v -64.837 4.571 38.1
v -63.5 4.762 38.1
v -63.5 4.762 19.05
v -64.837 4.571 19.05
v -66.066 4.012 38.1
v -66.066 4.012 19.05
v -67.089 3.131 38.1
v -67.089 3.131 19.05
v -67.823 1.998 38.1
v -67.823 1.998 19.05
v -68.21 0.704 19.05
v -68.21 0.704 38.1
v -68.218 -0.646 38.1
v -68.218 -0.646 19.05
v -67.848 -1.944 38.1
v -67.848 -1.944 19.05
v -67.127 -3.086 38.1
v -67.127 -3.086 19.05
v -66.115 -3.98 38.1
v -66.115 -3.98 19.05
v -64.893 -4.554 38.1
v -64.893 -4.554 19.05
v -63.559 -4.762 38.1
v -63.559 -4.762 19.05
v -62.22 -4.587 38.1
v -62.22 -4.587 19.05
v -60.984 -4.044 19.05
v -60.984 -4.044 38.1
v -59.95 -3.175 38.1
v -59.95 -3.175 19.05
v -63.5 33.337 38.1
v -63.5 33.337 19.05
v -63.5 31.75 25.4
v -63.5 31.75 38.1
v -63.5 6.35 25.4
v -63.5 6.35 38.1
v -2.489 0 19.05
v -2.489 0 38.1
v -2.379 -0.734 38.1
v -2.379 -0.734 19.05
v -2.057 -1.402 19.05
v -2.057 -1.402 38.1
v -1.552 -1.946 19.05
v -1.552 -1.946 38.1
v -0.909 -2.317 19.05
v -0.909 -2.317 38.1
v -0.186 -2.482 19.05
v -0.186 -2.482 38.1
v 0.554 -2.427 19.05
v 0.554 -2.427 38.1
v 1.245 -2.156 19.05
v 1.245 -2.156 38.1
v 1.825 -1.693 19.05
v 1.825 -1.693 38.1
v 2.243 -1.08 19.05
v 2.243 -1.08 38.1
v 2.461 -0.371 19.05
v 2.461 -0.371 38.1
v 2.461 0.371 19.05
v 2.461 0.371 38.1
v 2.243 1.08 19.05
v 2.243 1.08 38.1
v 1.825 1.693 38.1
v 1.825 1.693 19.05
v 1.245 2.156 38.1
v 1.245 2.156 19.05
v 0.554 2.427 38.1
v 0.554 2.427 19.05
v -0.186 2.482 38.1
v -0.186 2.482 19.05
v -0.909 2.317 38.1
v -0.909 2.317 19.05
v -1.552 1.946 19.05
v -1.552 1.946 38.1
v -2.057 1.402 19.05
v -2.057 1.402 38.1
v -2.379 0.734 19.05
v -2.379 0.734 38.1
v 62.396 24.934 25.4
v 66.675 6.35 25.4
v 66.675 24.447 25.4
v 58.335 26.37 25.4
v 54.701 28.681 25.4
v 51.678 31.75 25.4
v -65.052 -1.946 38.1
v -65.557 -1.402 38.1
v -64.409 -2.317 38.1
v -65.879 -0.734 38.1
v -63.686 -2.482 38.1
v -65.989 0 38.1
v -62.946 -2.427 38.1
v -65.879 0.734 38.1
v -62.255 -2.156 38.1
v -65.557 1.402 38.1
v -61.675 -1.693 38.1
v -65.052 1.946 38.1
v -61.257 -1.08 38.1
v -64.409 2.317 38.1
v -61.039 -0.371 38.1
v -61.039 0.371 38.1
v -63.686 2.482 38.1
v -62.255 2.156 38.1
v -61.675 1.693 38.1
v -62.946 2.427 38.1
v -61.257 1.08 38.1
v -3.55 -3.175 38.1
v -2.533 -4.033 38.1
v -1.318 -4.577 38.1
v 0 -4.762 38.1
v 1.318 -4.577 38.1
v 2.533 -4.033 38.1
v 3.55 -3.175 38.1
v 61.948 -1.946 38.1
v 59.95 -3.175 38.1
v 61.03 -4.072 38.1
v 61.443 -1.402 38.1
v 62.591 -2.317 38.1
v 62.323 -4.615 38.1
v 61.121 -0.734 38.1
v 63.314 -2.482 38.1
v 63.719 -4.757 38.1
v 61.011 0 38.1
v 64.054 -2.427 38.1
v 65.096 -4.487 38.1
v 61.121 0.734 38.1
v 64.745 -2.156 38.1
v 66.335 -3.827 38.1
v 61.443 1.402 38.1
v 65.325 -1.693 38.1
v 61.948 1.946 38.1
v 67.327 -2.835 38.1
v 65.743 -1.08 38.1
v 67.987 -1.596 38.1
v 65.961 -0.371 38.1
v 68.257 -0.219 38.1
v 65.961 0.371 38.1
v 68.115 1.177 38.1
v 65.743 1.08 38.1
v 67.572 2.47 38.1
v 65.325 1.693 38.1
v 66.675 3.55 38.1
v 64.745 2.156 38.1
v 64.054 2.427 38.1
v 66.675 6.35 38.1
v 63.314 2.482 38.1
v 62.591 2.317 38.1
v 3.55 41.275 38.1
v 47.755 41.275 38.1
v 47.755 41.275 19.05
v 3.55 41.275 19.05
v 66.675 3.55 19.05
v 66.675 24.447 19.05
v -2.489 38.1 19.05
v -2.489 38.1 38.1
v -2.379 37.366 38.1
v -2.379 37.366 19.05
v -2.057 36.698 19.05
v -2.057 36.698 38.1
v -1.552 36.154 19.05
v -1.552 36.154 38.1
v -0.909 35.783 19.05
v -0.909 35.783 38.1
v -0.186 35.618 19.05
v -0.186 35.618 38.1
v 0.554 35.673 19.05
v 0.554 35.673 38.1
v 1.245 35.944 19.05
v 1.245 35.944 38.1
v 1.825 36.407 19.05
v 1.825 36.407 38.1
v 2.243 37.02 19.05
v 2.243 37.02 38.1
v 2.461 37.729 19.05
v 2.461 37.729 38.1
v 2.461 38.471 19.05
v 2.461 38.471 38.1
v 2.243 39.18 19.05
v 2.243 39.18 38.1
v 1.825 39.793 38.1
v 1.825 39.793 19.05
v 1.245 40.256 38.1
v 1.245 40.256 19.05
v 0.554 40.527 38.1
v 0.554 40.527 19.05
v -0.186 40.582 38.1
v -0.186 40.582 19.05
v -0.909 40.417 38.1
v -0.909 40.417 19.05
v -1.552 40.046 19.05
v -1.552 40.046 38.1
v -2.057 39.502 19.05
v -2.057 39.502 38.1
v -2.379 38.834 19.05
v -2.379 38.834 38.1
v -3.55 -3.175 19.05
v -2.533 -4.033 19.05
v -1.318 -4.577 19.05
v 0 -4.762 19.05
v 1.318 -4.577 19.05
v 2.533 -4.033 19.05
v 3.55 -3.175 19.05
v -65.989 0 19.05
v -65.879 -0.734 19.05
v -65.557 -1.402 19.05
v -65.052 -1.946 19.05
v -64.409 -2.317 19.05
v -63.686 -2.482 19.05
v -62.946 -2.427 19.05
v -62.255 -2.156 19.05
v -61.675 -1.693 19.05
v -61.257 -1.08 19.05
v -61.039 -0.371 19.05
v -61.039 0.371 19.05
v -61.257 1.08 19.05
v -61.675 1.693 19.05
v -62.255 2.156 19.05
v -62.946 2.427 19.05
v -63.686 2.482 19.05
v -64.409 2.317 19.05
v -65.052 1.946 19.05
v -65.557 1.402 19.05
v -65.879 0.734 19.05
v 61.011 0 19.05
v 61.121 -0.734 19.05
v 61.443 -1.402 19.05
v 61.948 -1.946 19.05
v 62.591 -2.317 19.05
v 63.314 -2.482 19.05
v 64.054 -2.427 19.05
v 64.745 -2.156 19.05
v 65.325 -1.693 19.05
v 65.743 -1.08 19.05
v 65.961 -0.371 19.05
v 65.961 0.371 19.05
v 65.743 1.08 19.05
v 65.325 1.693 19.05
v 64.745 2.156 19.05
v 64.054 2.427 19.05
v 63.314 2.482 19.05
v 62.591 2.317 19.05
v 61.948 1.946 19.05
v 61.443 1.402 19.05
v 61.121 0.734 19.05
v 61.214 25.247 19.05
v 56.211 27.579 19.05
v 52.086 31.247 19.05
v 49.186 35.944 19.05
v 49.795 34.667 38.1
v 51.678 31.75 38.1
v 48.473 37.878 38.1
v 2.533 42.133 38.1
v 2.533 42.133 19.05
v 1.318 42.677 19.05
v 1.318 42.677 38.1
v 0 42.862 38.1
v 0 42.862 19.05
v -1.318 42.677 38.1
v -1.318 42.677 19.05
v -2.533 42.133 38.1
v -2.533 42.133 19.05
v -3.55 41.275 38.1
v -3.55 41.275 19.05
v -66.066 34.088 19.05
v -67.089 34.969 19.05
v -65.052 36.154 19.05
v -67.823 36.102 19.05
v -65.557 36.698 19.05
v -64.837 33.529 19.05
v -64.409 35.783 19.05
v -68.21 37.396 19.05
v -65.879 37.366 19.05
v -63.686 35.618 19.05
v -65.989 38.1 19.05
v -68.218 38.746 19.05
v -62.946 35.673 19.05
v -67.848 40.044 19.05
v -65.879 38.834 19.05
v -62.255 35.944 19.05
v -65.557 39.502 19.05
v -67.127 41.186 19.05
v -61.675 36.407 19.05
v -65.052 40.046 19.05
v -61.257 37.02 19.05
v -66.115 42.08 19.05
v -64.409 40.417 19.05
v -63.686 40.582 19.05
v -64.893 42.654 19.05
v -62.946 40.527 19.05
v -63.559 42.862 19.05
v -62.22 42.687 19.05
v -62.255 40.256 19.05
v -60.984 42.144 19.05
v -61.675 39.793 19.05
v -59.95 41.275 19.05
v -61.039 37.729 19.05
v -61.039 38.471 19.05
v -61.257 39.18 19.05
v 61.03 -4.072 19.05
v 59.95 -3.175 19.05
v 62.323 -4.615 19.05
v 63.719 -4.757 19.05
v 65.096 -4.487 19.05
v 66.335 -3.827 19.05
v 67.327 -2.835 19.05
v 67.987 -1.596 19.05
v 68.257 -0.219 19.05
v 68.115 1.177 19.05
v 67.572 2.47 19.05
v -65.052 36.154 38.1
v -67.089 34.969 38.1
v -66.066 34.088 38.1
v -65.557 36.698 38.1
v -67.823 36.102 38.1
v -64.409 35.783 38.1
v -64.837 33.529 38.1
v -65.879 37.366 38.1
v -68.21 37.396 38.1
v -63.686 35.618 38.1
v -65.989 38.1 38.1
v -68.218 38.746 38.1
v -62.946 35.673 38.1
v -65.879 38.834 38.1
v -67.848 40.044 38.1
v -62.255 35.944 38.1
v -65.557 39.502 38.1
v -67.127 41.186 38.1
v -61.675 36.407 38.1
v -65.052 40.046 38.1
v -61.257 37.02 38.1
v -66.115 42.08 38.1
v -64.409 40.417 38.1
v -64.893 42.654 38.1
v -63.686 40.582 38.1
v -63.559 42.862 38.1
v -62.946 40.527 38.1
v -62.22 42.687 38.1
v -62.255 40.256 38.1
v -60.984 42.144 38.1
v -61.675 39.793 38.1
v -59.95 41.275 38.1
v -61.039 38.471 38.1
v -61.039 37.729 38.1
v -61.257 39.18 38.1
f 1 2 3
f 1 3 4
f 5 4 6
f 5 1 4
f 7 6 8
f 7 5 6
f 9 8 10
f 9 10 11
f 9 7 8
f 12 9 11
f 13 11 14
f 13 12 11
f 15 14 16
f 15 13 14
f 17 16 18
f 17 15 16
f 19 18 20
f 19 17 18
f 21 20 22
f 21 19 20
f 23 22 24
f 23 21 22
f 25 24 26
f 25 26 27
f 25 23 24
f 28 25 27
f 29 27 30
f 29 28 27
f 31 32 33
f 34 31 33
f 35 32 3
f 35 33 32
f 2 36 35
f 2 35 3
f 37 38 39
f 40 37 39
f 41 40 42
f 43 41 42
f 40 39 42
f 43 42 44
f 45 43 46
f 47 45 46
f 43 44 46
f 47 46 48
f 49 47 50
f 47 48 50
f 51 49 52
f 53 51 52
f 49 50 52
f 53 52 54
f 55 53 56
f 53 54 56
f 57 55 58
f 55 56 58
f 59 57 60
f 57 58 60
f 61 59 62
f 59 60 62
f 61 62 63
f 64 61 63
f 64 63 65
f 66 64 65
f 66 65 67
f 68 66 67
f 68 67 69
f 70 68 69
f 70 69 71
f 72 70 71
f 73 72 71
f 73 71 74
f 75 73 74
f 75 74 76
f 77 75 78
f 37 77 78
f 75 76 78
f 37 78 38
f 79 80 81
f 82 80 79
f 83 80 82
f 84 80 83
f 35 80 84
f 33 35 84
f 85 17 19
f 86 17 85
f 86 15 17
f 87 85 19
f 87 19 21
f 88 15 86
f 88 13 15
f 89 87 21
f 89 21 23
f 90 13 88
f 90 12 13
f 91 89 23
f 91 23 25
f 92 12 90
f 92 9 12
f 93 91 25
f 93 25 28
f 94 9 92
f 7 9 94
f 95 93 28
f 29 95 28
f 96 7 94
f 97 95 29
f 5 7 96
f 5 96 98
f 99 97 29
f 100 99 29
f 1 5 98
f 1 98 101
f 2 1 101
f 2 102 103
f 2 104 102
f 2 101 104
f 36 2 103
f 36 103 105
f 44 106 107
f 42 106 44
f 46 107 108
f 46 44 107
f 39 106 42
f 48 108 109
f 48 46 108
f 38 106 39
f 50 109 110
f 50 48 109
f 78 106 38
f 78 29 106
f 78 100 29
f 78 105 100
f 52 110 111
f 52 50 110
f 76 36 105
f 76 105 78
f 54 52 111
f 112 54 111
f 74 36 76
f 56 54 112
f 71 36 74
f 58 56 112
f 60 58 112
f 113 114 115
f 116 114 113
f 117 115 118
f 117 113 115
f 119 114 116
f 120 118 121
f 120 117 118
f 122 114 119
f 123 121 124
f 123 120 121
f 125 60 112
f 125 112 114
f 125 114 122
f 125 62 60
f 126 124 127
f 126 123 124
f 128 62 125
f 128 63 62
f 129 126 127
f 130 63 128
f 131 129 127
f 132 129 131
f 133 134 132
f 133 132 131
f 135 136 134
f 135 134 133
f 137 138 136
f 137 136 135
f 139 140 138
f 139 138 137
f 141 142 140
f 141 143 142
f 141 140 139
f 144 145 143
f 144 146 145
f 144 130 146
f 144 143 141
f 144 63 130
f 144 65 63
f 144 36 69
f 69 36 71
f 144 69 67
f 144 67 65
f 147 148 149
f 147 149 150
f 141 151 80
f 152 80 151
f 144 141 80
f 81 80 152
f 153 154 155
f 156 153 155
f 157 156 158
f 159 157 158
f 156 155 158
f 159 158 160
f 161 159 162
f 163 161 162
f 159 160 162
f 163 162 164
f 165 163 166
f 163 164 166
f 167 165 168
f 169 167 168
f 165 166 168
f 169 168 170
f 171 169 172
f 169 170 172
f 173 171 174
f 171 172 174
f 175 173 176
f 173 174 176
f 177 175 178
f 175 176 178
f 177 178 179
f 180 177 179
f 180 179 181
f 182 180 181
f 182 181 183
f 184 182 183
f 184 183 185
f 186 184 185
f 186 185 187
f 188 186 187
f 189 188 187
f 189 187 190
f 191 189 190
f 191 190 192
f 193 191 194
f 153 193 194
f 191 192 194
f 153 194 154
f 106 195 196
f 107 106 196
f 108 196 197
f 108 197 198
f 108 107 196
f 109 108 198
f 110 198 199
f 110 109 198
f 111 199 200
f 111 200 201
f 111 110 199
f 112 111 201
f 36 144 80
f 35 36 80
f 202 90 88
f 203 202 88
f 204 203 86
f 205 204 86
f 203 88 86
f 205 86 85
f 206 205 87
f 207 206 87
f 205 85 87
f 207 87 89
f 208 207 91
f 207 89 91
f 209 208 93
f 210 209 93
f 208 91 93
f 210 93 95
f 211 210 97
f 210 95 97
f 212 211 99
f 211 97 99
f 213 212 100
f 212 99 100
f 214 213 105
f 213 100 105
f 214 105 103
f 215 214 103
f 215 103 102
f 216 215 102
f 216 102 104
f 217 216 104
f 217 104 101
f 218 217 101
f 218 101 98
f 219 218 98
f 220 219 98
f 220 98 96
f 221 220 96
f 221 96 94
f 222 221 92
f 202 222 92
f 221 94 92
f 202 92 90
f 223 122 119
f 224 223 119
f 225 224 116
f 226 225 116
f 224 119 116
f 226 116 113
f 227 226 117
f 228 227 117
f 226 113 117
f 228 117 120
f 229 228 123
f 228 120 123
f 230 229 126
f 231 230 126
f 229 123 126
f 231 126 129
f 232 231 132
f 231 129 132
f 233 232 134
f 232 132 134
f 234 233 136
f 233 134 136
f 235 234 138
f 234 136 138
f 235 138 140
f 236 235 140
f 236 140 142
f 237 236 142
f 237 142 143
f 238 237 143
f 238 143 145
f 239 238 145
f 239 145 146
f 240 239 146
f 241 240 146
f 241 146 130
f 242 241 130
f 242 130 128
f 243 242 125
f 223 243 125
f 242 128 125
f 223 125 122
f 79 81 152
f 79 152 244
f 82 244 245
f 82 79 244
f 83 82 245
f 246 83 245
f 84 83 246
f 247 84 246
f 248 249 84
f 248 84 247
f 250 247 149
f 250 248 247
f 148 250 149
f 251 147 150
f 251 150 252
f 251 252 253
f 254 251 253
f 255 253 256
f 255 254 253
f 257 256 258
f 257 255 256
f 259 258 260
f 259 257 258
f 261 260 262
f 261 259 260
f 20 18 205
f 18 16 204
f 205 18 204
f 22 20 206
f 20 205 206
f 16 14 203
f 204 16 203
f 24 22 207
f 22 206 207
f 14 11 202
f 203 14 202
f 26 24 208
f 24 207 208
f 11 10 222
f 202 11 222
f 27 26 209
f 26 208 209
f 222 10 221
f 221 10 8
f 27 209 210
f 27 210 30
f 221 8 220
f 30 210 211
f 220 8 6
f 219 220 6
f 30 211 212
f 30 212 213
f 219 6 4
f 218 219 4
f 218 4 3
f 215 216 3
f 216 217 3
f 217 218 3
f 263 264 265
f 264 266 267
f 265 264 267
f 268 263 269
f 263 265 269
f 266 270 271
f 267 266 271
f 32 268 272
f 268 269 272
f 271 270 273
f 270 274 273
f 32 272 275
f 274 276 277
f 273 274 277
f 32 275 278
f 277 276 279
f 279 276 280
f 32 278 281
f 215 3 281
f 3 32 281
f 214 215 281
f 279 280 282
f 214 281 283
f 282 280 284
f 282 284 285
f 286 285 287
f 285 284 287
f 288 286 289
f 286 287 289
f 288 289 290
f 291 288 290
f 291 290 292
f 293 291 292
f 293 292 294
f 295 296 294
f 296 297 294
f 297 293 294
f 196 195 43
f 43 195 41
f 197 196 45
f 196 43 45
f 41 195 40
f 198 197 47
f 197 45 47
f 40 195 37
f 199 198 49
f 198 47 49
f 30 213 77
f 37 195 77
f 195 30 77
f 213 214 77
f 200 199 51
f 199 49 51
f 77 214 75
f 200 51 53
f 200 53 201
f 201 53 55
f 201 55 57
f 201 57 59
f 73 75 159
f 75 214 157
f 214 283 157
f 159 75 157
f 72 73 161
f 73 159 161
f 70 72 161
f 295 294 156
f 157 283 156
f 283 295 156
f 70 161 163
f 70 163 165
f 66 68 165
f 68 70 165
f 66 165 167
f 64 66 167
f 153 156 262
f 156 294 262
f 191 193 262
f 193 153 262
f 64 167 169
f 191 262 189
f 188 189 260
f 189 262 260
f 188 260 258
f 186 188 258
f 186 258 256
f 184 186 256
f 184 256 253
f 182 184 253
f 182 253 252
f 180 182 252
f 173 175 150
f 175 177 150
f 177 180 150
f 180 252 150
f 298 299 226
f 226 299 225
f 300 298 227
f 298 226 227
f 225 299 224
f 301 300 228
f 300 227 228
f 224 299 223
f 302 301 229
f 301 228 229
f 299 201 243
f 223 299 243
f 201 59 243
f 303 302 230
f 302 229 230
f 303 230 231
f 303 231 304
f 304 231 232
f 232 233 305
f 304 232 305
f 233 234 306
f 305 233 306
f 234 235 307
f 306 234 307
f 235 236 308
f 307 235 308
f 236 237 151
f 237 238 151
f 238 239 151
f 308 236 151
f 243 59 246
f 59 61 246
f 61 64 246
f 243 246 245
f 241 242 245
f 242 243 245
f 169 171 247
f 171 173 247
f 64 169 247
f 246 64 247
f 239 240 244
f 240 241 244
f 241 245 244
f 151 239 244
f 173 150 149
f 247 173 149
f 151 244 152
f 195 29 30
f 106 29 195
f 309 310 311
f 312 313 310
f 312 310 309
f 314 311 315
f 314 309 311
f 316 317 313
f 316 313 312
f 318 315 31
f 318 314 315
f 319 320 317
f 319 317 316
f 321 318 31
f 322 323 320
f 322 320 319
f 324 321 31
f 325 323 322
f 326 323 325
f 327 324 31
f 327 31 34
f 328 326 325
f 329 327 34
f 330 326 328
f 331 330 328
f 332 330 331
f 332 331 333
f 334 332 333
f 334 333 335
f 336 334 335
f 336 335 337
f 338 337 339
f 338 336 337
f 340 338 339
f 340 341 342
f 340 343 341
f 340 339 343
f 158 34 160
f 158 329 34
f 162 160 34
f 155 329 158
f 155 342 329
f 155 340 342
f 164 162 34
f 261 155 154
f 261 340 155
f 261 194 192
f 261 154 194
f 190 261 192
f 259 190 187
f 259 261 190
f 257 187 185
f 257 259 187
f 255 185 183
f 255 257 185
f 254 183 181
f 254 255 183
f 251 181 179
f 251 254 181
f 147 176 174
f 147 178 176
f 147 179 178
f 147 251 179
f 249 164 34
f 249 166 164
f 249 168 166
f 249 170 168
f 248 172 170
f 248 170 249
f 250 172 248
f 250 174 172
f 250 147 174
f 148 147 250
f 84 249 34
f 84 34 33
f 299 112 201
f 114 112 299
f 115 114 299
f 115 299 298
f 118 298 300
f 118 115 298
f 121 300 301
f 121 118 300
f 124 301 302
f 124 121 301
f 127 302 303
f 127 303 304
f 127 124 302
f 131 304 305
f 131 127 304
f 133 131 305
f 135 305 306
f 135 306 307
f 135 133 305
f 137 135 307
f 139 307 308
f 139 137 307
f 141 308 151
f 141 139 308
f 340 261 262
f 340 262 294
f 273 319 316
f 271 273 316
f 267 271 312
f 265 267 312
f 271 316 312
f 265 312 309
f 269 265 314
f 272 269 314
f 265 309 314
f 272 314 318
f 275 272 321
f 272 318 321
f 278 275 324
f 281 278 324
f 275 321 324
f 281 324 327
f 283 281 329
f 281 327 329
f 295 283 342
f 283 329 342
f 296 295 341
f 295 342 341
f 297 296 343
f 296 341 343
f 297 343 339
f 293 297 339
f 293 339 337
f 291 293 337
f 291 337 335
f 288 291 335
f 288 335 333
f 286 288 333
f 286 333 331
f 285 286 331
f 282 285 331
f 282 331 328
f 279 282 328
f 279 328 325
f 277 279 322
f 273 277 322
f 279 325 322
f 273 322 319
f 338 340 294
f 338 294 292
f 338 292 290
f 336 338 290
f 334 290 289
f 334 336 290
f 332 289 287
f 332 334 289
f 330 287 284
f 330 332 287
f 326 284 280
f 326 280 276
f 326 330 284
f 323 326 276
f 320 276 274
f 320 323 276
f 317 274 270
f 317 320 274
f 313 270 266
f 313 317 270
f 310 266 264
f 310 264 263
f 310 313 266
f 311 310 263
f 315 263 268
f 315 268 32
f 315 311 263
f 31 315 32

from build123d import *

# Parameters (mm, degrees)
SKETCH1_R           = 2.4892
BOSS_EXTRUDE1_DEPTH = 19.05
SKETCH2_W           = 12.7
SKETCH2_H           = 25.4
CUT_EXTRUDE1_DEPTH  = 140.862263719


with BuildPart() as part:
    # Sketch1 → Boss-Extrude1 (new body)
    # profile 1 of 2: a face of its own
    with BuildSketch(Plane.XY):
        with BuildLine():
            ThreePointArc((-3.549757914, -3.175), (0, -4.7625), (3.549757914, -3.175))
            Line((3.549757914, -3.175), (59.950242086, -3.175))
            ThreePointArc((59.950242086, -3.175), (66.867596045, -3.367596045), (66.675, 3.549757914))
            Line((66.675, 3.549757914), (66.675, 24.4475))
            ThreePointArc((66.675, 24.4475), (54.014749706, 29.263015025), (47.755090017, 41.275))
            Line((47.755090017, 41.275), (3.549757914, 41.275))
            Line((3.549757914, 41.275), (-3.549757914, 41.275))
            Line((-3.549757914, 41.275), (-59.950242086, 41.275))
            ThreePointArc((-59.950242086, 41.275), (-67.8475478, 40.044282483), (-63.5, 33.3375))
            Line((-63.5, 33.3375), (-63.5, 4.7625))
            ThreePointArc((-63.5, 4.7625), (-67.8475478, -1.944282483), (-59.950242086, -3.175))
            Line((-59.950242086, -3.175), (-3.549757914, -3.175))
        make_face()
        with Locations(Location((-63.5, 0, 0), (0, 0, 180))):
            Circle(SKETCH1_R, mode=Mode.SUBTRACT)
        with Locations(Location((0, 0, 0), (0, 0, 180))):
            Circle(SKETCH1_R, mode=Mode.SUBTRACT)
        with Locations(Location((63.5, 0, 0), (0, 0, 180))):
            Circle(SKETCH1_R, mode=Mode.SUBTRACT)
        with Locations(Location((-63.5, 38.1, 0), (0, 0, 180))):
            Circle(SKETCH1_R, mode=Mode.SUBTRACT)
        with Locations(Location((0, 38.1, 0), (0, 0, 180))):
            Circle(SKETCH1_R, mode=Mode.SUBTRACT)
    # profile 2 of 2: a face of its own
    with BuildSketch(Plane.XY):
        with BuildLine():
            Line((-3.549757914, 41.275), (3.549757914, 41.275))
            ThreePointArc((3.549757914, 41.275), (0, 42.8625), (-3.549757914, 41.275))
        make_face()
    extrude(amount=BOSS_EXTRUDE1_DEPTH)

    # Sketch2 → Cut-Extrude1 (cut, through all)
    with BuildSketch(Plane.ZY.offset(63.5)):
        with Locations((6.35, 19.05)):
            Rectangle(SKETCH2_W, SKETCH2_H)
    extrude(amount=-CUT_EXTRUDE1_DEPTH, mode=Mode.SUBTRACT)


with BuildPart() as body_2:
    # Mirror1: mirrored copy
    add(part.part.mirror(Plane.XY.offset(19.05)))


solid = body_2.part
